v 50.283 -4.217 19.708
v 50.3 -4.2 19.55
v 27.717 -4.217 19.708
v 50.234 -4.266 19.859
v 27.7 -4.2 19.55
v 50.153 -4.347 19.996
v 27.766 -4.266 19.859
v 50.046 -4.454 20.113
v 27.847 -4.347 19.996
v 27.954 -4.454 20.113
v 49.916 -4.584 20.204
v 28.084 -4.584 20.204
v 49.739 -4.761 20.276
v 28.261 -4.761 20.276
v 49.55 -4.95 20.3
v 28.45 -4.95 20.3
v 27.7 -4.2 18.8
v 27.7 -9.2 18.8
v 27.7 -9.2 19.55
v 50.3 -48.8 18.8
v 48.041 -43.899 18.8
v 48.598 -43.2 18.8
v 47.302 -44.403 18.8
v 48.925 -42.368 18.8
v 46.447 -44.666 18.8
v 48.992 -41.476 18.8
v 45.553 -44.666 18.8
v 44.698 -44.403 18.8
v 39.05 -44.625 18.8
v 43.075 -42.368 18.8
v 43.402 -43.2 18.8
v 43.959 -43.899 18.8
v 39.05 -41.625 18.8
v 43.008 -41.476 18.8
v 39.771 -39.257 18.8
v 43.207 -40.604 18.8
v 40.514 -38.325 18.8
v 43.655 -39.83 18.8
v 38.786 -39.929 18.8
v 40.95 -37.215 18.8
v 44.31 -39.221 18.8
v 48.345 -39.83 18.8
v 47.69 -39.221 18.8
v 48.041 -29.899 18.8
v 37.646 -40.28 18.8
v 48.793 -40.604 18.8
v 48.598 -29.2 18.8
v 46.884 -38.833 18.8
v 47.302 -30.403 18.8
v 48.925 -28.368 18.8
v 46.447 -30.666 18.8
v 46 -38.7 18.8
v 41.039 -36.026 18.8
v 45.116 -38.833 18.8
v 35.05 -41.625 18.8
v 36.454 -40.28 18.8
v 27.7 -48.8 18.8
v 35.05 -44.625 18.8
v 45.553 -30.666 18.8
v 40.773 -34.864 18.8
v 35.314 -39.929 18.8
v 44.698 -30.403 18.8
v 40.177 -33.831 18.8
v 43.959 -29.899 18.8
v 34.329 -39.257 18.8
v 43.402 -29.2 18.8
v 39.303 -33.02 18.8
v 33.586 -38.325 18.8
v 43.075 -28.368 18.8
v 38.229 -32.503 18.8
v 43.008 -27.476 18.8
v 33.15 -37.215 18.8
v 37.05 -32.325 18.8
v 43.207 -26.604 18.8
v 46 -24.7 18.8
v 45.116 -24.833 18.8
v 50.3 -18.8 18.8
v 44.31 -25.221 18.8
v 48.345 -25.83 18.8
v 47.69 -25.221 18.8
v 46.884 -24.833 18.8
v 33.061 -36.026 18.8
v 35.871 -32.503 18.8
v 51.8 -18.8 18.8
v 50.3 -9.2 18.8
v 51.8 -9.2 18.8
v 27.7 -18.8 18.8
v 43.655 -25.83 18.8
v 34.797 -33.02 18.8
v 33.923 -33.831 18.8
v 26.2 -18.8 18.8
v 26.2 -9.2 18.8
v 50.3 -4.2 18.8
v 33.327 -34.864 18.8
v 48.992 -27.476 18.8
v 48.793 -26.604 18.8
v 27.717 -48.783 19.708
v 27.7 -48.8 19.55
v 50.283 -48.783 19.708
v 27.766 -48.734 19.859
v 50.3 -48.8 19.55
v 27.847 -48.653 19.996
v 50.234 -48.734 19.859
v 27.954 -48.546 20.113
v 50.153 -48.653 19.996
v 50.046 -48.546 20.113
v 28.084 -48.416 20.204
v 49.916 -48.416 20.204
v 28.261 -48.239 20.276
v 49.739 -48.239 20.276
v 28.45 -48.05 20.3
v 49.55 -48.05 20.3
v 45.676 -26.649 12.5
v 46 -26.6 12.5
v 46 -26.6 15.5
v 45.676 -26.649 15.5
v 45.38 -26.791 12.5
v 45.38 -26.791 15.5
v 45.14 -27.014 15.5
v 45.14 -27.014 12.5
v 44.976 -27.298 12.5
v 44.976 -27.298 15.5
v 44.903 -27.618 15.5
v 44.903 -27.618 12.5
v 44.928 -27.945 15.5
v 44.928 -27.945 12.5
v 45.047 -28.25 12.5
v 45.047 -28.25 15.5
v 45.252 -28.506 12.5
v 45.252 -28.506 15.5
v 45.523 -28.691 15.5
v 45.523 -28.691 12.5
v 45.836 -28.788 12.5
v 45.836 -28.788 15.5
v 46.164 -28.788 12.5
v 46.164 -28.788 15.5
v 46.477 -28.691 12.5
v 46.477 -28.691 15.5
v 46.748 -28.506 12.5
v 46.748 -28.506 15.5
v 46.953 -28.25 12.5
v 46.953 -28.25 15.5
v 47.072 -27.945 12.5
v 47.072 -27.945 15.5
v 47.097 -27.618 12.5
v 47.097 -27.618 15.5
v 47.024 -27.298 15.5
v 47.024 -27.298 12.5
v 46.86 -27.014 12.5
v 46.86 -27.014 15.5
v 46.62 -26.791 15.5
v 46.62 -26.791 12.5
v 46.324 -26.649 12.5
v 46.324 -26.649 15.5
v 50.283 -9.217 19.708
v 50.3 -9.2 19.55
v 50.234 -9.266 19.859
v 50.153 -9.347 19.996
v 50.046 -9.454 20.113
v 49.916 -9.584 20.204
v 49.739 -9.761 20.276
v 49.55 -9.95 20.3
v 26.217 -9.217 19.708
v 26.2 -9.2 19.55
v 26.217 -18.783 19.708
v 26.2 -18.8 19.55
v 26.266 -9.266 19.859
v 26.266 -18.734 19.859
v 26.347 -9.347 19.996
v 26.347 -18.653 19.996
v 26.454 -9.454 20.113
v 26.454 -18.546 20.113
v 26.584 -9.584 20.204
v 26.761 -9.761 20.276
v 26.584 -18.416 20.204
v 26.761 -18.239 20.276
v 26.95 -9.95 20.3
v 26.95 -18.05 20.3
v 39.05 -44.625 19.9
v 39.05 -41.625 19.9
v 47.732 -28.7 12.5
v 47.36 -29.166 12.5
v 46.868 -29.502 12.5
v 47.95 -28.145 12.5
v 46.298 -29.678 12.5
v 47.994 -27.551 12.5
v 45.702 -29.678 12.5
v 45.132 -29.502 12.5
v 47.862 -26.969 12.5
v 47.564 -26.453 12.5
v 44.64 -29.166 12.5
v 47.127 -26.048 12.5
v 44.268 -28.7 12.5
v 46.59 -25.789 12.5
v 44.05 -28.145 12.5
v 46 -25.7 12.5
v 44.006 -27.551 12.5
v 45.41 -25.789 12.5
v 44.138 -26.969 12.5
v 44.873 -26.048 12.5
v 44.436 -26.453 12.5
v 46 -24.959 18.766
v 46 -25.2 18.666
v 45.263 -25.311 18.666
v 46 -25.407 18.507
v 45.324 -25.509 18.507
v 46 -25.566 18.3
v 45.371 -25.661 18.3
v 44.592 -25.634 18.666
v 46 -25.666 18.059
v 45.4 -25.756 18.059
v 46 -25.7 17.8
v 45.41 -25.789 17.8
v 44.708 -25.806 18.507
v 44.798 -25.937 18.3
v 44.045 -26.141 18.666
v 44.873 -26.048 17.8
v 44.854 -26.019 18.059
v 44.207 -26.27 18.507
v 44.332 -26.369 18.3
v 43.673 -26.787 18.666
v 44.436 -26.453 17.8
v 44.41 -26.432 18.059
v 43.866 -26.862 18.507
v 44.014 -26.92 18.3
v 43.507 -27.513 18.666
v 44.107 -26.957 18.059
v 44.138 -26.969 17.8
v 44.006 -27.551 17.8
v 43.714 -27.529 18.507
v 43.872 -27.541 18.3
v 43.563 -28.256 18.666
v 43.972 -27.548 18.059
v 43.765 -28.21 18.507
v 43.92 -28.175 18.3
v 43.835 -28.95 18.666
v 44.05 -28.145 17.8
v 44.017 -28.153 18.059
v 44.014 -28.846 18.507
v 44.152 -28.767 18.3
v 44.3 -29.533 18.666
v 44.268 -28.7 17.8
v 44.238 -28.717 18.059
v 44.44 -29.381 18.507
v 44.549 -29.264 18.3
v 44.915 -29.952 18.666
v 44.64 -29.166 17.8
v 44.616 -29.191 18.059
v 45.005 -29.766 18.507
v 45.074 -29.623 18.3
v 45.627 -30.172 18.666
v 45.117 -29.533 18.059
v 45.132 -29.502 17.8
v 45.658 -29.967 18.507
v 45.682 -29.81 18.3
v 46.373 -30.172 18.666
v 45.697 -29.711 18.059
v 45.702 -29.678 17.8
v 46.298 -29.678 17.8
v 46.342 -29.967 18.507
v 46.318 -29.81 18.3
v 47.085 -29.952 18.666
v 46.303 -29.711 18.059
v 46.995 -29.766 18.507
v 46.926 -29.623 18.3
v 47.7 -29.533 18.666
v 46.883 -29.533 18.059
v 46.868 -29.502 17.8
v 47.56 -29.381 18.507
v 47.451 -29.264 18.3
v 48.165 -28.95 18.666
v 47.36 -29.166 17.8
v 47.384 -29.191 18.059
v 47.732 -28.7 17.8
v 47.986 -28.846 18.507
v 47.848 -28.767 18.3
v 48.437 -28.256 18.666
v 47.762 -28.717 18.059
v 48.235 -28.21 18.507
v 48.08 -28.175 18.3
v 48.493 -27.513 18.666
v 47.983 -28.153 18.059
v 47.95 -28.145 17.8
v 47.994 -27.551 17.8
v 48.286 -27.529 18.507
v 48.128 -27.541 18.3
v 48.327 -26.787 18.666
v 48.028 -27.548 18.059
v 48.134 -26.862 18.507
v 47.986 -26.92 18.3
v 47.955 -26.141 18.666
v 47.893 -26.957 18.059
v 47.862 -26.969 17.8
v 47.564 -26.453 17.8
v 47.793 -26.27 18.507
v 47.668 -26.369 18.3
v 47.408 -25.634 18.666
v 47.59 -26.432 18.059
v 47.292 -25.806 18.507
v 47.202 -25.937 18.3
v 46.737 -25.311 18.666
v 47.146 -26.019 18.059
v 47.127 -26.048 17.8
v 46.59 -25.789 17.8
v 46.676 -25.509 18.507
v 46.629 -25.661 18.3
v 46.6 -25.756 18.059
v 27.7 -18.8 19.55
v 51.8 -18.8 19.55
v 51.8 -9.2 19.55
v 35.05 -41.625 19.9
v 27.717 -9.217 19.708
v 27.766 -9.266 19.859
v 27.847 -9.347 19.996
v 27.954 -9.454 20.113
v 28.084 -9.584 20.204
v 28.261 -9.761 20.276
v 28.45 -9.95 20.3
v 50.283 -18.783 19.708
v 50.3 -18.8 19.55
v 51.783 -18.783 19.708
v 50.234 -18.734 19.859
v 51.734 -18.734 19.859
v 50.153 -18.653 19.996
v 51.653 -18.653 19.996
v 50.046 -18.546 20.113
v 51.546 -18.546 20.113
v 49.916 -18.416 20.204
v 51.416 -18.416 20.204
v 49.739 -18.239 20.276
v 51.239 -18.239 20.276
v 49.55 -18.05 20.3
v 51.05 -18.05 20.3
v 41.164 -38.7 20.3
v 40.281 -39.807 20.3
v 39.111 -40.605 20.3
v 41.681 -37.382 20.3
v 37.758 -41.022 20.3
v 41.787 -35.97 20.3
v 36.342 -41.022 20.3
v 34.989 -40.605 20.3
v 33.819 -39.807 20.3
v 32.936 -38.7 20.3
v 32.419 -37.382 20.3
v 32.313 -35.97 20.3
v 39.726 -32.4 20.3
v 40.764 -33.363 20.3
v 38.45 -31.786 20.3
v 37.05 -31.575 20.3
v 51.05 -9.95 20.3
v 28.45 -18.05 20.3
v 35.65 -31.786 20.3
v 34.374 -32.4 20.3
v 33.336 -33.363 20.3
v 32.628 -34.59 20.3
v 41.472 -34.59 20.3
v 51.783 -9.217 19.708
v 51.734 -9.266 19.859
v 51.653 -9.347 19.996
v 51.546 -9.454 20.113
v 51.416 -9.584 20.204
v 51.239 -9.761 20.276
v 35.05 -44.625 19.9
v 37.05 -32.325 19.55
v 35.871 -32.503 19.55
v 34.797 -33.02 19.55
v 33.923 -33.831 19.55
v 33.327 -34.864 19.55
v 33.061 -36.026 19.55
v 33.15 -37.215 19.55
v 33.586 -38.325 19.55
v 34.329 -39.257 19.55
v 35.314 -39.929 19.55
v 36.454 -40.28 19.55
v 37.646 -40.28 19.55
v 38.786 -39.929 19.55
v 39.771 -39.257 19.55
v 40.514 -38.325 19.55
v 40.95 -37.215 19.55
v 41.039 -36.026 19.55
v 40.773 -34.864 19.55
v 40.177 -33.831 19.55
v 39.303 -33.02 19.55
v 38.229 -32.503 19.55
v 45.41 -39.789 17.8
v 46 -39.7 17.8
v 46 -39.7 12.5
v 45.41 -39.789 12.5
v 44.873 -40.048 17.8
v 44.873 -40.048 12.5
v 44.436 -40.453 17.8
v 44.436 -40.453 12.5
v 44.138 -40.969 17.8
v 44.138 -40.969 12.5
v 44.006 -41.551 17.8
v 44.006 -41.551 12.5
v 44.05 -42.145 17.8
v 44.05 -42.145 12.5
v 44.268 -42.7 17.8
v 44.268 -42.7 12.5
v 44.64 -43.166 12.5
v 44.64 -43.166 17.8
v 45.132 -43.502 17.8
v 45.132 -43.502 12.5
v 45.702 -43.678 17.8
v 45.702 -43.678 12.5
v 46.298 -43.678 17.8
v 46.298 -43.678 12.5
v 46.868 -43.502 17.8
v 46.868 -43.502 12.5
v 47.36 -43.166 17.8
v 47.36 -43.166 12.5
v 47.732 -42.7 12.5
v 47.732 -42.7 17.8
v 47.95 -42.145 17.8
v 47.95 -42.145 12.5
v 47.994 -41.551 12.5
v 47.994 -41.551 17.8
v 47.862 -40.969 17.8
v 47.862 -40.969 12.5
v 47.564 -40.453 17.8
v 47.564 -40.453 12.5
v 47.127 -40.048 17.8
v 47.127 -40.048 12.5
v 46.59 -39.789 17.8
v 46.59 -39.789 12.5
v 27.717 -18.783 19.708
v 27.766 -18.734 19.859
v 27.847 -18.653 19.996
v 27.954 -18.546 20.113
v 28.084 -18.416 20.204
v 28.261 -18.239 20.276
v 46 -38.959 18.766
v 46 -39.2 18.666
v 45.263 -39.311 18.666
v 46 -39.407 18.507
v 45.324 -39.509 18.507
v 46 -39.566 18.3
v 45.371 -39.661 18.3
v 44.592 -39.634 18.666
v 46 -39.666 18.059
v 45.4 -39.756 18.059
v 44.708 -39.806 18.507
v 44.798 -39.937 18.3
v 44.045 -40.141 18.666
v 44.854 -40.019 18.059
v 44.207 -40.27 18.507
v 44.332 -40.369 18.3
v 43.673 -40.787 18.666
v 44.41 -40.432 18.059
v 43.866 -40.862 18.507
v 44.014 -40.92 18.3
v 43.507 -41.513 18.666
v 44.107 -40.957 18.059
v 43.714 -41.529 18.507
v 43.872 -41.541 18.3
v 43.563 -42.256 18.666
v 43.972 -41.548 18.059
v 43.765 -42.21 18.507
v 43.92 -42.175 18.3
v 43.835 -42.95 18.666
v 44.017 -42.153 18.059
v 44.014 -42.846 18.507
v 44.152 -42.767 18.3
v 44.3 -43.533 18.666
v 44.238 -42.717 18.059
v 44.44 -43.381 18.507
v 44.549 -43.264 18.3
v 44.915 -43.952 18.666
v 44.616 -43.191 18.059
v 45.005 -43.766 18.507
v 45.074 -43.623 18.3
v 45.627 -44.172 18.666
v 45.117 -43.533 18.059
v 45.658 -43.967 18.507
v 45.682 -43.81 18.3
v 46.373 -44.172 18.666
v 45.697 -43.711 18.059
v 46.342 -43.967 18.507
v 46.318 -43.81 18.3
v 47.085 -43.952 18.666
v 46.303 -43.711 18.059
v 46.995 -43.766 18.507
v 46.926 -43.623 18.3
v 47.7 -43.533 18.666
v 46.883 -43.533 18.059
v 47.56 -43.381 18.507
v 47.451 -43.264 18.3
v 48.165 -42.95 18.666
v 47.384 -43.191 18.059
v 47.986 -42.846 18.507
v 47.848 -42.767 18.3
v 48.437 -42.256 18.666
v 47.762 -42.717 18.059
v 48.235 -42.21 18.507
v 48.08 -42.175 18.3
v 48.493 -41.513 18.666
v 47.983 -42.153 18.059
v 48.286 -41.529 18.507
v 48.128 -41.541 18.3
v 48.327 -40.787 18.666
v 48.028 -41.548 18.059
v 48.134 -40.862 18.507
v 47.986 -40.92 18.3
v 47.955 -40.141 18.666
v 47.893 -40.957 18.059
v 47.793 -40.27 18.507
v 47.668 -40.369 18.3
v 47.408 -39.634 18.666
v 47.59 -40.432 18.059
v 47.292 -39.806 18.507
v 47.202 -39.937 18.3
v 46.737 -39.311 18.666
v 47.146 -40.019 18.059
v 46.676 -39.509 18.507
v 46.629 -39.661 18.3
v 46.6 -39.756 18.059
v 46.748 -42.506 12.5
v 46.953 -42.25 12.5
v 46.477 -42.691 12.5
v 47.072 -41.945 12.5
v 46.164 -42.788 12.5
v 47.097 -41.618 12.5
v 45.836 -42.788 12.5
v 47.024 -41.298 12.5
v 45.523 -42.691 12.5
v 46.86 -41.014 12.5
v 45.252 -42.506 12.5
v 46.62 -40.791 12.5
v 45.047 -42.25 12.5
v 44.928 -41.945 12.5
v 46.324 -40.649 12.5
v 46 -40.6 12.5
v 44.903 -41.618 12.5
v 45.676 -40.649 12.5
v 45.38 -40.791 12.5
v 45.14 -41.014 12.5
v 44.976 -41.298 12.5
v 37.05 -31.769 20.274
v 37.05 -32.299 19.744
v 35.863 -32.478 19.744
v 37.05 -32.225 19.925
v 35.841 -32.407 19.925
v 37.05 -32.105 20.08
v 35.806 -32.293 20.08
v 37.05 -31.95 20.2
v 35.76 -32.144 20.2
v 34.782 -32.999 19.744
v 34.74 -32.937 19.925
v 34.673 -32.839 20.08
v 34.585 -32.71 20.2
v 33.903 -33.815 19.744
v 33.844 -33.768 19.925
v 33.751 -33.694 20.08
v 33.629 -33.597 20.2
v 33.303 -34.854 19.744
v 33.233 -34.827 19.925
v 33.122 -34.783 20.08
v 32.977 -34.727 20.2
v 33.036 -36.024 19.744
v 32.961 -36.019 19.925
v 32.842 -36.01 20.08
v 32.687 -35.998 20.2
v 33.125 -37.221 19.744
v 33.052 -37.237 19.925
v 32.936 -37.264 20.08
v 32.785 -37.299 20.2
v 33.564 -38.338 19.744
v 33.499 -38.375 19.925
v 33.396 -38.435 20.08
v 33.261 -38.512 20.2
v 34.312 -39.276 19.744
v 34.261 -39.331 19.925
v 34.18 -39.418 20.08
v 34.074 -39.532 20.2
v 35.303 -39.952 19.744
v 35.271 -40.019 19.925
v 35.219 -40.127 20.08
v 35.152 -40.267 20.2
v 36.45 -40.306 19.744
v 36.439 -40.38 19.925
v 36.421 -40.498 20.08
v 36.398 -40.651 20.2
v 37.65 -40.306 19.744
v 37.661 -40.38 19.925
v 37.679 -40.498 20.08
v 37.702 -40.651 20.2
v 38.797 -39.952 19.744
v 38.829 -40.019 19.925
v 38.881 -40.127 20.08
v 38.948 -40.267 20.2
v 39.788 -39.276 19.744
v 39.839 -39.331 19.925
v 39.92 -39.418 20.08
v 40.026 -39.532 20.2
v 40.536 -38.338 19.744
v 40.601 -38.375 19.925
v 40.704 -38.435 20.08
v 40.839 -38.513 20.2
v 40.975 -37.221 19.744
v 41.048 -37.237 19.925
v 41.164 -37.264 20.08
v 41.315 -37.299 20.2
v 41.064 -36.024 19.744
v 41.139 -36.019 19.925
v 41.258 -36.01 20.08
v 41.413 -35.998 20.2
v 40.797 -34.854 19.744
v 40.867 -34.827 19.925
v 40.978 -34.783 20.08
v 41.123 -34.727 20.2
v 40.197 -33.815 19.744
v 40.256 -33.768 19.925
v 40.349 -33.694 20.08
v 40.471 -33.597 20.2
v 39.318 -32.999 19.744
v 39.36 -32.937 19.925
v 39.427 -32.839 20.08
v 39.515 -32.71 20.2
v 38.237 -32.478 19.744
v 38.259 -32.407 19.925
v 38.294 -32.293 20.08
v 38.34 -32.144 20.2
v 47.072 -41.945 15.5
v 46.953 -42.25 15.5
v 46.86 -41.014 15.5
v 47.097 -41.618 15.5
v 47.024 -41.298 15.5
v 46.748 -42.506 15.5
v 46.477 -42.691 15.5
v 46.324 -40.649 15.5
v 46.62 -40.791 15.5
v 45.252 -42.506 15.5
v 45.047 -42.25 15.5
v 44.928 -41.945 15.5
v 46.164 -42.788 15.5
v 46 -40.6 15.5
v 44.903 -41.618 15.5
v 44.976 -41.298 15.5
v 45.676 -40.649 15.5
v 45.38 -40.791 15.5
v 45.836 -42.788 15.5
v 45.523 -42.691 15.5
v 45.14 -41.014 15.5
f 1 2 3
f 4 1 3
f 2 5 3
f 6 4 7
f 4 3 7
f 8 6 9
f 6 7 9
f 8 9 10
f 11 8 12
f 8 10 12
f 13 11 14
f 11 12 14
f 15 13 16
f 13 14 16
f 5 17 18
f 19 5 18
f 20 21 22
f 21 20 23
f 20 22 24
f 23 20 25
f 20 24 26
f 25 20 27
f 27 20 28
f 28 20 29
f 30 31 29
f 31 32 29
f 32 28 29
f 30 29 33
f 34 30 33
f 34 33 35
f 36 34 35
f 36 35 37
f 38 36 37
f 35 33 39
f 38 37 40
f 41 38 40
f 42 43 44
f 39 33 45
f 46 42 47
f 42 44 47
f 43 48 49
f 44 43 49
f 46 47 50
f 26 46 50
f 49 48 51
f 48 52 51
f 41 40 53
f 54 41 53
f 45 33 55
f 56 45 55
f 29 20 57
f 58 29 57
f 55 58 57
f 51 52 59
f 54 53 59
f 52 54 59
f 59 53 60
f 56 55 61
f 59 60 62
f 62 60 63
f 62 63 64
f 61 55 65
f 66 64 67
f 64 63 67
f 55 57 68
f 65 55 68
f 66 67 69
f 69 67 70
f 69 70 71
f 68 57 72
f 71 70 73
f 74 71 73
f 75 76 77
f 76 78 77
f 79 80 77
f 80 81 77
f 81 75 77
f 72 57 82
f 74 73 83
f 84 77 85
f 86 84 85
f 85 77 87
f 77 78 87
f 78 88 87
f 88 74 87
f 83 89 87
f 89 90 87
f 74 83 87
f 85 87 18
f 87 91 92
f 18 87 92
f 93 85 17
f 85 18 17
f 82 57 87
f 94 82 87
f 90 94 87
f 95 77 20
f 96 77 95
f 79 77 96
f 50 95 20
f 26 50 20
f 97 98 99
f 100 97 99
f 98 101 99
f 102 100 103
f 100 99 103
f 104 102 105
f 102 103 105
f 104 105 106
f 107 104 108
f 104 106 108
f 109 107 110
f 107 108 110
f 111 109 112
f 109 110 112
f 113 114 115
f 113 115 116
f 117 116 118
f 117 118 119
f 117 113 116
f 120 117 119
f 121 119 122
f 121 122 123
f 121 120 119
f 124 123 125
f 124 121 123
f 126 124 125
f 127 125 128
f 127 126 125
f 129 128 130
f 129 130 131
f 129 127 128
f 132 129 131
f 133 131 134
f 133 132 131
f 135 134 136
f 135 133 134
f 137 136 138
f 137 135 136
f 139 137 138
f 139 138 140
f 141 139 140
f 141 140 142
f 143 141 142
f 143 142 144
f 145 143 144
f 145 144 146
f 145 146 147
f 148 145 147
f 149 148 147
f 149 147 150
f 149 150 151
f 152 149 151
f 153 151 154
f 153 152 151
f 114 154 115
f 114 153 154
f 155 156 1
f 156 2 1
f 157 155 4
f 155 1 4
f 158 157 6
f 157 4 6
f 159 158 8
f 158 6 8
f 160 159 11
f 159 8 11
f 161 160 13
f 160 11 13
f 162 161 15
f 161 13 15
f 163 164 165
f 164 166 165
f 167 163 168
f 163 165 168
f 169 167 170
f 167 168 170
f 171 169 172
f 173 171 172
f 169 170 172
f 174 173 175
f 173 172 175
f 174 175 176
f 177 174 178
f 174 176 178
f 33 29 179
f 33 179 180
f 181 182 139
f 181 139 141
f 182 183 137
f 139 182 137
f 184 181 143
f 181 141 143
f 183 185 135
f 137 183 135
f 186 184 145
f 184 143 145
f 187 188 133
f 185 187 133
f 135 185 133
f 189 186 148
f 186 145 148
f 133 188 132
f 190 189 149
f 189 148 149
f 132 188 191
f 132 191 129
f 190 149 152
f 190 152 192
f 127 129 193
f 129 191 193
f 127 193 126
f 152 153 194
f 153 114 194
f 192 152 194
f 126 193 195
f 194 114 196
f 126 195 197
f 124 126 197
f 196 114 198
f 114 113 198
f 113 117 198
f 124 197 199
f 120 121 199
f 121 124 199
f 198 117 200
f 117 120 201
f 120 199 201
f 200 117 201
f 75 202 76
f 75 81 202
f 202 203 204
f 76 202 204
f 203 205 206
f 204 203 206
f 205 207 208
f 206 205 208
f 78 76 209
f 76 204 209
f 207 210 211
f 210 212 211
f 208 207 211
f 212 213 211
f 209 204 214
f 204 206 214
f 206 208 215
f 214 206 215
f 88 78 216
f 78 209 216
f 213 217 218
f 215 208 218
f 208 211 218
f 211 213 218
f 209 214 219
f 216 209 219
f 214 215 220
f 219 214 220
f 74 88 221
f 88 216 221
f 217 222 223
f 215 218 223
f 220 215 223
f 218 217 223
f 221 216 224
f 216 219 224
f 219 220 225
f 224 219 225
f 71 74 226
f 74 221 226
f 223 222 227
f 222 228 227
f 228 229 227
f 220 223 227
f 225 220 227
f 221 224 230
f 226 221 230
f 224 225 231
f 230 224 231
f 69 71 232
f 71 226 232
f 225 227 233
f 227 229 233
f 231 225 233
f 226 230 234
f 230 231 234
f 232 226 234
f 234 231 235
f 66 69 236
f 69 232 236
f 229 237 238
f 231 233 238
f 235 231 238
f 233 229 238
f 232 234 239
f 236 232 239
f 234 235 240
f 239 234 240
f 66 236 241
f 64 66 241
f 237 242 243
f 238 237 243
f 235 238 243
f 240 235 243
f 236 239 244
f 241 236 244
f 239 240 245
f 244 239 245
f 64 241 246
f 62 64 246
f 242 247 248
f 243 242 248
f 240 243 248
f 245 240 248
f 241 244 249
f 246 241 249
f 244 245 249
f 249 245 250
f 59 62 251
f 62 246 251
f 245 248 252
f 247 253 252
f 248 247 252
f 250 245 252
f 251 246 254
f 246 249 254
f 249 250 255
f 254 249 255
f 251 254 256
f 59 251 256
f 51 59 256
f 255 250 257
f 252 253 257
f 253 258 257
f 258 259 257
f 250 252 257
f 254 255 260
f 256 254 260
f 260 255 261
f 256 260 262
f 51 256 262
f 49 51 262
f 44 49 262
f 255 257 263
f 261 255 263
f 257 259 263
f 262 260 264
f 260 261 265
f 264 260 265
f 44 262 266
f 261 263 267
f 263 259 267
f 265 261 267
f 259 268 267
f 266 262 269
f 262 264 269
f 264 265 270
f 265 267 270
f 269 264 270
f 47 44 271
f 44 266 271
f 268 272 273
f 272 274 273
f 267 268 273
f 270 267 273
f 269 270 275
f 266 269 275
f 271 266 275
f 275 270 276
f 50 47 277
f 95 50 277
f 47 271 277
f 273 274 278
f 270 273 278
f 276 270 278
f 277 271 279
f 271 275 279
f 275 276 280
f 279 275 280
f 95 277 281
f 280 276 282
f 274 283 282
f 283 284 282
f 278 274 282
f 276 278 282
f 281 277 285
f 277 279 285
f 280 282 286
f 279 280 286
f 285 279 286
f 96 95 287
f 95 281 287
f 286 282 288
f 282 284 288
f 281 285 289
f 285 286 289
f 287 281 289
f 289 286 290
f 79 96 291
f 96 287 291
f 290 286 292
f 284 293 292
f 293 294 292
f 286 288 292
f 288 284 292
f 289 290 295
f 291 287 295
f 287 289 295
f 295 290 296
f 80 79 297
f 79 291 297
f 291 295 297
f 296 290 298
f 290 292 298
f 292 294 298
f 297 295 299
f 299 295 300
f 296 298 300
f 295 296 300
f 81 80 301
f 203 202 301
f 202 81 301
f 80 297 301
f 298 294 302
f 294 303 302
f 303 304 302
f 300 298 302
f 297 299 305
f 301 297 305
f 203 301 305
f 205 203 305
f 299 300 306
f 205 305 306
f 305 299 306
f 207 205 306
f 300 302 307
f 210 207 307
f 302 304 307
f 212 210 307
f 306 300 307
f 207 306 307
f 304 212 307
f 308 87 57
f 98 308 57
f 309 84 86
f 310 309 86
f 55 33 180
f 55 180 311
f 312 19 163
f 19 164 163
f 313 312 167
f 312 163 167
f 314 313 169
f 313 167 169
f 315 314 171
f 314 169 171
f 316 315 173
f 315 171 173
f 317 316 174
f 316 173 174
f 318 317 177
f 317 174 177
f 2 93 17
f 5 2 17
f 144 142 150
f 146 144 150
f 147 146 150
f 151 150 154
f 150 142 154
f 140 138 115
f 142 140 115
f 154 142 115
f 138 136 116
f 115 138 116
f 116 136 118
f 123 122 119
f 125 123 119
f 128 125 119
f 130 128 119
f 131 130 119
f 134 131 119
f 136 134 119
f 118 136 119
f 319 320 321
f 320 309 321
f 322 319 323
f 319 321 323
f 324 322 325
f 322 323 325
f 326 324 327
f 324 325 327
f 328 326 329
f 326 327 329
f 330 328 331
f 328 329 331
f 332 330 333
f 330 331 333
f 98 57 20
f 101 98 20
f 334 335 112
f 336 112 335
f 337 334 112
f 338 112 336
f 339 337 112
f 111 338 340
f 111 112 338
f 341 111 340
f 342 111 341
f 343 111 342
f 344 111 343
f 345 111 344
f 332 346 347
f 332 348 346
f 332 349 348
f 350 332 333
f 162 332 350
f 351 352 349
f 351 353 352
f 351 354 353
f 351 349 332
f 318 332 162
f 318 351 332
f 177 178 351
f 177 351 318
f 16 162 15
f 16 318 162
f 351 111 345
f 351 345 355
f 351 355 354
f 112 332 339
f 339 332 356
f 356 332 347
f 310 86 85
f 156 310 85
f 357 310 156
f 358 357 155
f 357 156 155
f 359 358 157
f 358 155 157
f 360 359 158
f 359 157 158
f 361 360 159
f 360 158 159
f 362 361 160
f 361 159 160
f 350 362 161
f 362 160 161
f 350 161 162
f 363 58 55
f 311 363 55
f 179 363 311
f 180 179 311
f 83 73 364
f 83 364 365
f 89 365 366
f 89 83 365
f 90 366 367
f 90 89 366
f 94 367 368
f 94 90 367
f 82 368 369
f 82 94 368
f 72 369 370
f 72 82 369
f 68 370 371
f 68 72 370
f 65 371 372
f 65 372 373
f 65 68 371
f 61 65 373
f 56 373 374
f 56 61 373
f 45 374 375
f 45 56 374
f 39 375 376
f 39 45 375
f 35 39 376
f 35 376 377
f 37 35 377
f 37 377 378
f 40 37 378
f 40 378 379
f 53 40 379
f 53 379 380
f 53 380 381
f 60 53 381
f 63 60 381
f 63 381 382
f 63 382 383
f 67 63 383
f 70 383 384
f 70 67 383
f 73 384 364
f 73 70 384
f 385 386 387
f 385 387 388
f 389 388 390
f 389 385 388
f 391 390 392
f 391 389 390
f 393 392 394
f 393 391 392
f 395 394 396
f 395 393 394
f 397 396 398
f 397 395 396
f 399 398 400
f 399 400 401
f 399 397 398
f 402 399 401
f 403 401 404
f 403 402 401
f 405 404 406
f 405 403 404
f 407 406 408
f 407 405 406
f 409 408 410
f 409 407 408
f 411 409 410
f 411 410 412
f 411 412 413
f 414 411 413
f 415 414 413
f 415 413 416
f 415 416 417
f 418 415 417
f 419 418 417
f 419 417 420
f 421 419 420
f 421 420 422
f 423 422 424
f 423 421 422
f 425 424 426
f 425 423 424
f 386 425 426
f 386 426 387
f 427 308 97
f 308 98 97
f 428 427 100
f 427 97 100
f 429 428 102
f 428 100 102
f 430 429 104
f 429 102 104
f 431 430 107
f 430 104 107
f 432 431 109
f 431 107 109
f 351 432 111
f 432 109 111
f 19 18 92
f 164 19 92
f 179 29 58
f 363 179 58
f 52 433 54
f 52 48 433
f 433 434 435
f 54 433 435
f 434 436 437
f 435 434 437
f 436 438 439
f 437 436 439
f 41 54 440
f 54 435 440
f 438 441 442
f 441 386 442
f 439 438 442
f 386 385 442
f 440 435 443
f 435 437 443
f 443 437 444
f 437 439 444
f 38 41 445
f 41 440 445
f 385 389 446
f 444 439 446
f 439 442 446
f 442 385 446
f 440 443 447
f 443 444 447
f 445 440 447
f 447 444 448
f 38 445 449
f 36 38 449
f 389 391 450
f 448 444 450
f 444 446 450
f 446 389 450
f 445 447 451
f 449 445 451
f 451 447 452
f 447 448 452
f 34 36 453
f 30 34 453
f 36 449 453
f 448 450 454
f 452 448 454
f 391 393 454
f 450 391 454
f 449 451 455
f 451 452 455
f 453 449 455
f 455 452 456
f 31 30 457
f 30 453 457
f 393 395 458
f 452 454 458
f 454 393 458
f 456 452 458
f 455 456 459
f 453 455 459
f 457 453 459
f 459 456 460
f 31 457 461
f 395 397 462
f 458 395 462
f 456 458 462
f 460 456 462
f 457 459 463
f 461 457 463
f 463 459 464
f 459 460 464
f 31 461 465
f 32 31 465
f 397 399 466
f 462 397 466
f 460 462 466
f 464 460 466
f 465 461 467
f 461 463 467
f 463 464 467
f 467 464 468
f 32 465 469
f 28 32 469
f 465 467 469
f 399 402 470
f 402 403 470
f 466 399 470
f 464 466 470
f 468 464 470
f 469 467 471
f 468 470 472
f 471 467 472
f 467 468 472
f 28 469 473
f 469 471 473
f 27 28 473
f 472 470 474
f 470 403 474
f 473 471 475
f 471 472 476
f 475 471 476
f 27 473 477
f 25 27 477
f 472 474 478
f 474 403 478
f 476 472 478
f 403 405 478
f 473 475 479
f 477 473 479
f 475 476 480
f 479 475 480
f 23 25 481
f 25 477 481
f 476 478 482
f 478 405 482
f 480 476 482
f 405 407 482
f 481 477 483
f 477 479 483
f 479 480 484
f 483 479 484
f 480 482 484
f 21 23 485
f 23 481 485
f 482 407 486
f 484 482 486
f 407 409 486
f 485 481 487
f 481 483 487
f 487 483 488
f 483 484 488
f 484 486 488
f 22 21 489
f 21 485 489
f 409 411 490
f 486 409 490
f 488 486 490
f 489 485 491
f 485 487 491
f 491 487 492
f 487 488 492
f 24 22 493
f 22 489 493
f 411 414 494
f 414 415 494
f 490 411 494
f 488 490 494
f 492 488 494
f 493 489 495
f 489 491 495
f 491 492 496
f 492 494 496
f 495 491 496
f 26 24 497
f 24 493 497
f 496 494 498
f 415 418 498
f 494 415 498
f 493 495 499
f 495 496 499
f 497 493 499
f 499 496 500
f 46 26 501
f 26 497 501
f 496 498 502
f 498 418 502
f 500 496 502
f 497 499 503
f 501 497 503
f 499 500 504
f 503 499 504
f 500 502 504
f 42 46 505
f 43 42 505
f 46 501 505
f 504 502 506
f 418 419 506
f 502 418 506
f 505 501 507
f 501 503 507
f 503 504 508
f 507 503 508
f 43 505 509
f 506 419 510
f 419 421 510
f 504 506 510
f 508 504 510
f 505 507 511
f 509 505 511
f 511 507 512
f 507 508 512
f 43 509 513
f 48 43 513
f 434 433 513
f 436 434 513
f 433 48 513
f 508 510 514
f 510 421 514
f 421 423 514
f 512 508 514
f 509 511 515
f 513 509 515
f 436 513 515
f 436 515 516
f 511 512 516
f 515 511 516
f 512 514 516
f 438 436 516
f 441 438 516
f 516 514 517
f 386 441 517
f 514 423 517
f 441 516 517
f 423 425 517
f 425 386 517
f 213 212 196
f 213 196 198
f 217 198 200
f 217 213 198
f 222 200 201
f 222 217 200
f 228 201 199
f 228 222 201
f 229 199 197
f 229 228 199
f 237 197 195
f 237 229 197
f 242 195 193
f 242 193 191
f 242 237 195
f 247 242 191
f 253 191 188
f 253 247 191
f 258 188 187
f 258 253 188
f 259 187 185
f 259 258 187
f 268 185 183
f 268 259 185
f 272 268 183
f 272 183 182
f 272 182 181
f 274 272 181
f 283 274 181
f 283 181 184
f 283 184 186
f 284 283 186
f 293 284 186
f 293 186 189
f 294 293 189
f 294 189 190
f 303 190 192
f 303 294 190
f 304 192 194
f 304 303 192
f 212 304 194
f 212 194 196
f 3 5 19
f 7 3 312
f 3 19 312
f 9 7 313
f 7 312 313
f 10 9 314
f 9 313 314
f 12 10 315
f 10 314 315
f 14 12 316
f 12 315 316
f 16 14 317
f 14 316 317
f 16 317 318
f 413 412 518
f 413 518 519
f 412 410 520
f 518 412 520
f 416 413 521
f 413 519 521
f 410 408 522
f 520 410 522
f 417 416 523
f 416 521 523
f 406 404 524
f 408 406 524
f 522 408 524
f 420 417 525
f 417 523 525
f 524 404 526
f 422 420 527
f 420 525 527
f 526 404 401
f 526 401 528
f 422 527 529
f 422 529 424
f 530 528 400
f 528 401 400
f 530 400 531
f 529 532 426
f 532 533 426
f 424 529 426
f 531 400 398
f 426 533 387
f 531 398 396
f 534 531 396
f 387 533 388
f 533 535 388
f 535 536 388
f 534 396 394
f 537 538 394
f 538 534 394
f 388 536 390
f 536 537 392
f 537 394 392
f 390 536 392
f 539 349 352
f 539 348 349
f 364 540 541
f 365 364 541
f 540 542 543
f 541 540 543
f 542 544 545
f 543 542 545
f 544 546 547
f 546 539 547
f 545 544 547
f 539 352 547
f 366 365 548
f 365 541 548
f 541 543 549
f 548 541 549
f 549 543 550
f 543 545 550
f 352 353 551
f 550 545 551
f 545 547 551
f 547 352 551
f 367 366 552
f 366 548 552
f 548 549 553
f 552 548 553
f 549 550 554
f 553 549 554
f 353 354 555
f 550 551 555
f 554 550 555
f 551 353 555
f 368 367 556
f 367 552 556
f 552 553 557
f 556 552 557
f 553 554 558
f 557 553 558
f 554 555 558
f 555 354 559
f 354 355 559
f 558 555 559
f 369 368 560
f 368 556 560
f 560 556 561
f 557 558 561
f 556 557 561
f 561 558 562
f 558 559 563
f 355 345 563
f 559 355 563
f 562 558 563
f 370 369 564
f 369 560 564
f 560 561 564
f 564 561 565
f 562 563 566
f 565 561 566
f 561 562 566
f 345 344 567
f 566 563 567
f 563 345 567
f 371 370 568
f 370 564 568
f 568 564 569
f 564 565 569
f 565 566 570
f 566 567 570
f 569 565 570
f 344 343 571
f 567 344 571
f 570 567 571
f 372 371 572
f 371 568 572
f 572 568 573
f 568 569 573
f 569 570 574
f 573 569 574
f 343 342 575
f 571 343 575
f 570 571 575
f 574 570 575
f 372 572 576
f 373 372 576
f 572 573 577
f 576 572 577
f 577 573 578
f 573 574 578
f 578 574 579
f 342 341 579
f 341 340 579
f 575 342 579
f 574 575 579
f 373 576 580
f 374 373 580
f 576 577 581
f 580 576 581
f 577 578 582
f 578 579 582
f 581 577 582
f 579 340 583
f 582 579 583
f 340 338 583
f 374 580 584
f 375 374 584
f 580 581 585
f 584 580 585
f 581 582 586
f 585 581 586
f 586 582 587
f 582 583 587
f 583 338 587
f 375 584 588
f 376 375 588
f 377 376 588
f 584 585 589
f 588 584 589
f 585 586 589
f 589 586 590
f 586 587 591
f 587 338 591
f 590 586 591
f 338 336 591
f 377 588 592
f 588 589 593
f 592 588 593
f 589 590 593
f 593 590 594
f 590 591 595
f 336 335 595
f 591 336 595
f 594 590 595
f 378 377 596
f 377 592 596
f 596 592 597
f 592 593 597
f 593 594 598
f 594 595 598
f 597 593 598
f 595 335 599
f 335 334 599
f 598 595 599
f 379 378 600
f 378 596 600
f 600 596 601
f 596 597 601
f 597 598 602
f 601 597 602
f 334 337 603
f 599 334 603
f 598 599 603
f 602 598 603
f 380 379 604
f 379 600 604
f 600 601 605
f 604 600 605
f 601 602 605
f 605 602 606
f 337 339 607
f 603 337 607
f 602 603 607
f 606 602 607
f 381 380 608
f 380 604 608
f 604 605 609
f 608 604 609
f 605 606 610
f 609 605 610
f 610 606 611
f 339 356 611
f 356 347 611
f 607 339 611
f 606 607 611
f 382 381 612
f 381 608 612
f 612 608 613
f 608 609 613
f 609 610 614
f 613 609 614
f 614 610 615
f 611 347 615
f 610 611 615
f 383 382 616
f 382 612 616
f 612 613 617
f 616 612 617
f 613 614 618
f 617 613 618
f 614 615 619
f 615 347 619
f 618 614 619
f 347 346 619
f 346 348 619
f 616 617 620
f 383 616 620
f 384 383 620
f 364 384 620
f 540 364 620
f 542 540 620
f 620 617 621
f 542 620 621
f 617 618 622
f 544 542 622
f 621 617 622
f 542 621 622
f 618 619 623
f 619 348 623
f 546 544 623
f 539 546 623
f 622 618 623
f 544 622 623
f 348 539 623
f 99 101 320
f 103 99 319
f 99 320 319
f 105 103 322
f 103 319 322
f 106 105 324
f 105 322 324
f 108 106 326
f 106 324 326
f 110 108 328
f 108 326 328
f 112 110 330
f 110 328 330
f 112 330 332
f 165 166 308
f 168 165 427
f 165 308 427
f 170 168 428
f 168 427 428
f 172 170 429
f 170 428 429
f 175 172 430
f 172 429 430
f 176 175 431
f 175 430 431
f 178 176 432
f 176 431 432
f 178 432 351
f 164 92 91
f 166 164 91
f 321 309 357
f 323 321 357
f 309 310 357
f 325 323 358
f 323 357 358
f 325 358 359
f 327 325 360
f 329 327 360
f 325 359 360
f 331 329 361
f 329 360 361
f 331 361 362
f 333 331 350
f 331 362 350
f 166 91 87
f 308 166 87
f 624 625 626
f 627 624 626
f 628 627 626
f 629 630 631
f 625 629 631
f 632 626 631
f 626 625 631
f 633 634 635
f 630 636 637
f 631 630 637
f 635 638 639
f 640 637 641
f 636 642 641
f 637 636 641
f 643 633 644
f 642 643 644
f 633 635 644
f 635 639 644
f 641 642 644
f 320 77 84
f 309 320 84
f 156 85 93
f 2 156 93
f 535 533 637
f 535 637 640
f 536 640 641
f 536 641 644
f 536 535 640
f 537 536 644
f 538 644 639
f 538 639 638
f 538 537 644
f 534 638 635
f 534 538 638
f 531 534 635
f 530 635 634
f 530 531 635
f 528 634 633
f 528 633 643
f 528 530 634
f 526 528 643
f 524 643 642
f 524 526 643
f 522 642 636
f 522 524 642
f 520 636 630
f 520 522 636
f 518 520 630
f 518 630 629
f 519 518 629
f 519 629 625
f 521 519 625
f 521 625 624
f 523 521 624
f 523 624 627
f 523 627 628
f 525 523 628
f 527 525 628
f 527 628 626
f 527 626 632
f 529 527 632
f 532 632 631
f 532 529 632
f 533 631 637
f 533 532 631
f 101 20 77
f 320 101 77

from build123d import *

# Parameters (mm, degrees)
SKETCH011_R             = 4
PAD004_DEPTH            = 1.5
SKETCH012_R             = 2
PAD005_DEPTH            = 6.3
SKETCH013_W             = 3
SKETCH013_H             = 4
POCKET004_DEPTH         = 1.1
FILLET004_R             = 1
SKETCH014_R             = 1.1
POCKET010_DEPTH         = 3
FILLET016_R             = 0.75
BODY002_PLACEMENT_ANGLE = 90


with BuildPart() as part:
    # Sketch011 → Pad004 (new body)
    with BuildSketch(Plane.XY):
        Polygon((29.8, 11.3), (24.8, 11.3), (24.8, 12.8), (15.2, 12.8), (15.2, 11.3), (-14.8, 11.3), (-14.8, -11.3), (15.2, -11.3), (15.2, -12.8), (24.8, -12.8), (24.8, -11.3), (29.8, -11.3), align=None)
        with Locations((-2.325, 1.95)):
            Circle(SKETCH011_R, mode=Mode.SUBTRACT)
    extrude(amount=PAD004_DEPTH)

    # Sketch012 → Pad005 (join)
    with BuildSketch(Plane.XY):
        with Locations((6.3, -7)):
            Circle(SKETCH012_R)
        with Locations((-7.7, -7)):
            Circle(SKETCH012_R)
    extrude(amount=-PAD005_DEPTH)

    # Sketch013 → Pocket004 (cut)
    with BuildSketch(Plane.XY):
        with Locations((-9.125, 1.95)):
            Rectangle(SKETCH013_W, SKETCH013_H)
    extrude(amount=POCKET004_DEPTH, mode=Mode.SUBTRACT)

    # Fillet004
    fillet004_edges = [part.edges().sort_by_distance(p)[0] for p in [
        (4.3, -7, 0),
        (-9.7, -7, 0),
    ]]
    fillet(fillet004_edges, radius=FILLET004_R)

    # Sketch014 → Pocket010 (cut)
    with BuildSketch(Plane.XY.offset(-6.3)):
        with Locations((-7.7, -7)):
            Circle(SKETCH014_R)
        with Locations((6.3, -7)):
            Circle(SKETCH014_R)
    extrude(amount=POCKET010_DEPTH, mode=Mode.SUBTRACT)

    # Fillet016
    fillet016_edges = [part.edges().sort_by_distance(p)[0] for p in [
        (27.3, -11.3, 1.5),
        (29.8, 0, 1.5),
        (27.3, 11.3, 1.5),
        (24.8, 12.05, 1.5),
        (20, 12.8, 1.5),
        (15.2, 12.05, 1.5),
        (0.2, 11.3, 1.5),
        (-14.8, 0, 1.5),
        (0.2, -11.3, 1.5),
        (15.2, -12.05, 1.5),
        (20, -12.8, 1.5),
        (24.8, -12.05, 1.5),
        (-6.325, 1.95, 1.5),
    ]]
    fillet(fillet016_edges, radius=FILLET016_R)


with BuildPart() as part_1:
    # Body002 placement: moved
    add(part.part.moved(Location((39, -34, 18.8))).rotate(Axis((39, -34, 18.8), (0, 0, 1)), BODY002_PLACEMENT_ANGLE))


solid = part_1.part
